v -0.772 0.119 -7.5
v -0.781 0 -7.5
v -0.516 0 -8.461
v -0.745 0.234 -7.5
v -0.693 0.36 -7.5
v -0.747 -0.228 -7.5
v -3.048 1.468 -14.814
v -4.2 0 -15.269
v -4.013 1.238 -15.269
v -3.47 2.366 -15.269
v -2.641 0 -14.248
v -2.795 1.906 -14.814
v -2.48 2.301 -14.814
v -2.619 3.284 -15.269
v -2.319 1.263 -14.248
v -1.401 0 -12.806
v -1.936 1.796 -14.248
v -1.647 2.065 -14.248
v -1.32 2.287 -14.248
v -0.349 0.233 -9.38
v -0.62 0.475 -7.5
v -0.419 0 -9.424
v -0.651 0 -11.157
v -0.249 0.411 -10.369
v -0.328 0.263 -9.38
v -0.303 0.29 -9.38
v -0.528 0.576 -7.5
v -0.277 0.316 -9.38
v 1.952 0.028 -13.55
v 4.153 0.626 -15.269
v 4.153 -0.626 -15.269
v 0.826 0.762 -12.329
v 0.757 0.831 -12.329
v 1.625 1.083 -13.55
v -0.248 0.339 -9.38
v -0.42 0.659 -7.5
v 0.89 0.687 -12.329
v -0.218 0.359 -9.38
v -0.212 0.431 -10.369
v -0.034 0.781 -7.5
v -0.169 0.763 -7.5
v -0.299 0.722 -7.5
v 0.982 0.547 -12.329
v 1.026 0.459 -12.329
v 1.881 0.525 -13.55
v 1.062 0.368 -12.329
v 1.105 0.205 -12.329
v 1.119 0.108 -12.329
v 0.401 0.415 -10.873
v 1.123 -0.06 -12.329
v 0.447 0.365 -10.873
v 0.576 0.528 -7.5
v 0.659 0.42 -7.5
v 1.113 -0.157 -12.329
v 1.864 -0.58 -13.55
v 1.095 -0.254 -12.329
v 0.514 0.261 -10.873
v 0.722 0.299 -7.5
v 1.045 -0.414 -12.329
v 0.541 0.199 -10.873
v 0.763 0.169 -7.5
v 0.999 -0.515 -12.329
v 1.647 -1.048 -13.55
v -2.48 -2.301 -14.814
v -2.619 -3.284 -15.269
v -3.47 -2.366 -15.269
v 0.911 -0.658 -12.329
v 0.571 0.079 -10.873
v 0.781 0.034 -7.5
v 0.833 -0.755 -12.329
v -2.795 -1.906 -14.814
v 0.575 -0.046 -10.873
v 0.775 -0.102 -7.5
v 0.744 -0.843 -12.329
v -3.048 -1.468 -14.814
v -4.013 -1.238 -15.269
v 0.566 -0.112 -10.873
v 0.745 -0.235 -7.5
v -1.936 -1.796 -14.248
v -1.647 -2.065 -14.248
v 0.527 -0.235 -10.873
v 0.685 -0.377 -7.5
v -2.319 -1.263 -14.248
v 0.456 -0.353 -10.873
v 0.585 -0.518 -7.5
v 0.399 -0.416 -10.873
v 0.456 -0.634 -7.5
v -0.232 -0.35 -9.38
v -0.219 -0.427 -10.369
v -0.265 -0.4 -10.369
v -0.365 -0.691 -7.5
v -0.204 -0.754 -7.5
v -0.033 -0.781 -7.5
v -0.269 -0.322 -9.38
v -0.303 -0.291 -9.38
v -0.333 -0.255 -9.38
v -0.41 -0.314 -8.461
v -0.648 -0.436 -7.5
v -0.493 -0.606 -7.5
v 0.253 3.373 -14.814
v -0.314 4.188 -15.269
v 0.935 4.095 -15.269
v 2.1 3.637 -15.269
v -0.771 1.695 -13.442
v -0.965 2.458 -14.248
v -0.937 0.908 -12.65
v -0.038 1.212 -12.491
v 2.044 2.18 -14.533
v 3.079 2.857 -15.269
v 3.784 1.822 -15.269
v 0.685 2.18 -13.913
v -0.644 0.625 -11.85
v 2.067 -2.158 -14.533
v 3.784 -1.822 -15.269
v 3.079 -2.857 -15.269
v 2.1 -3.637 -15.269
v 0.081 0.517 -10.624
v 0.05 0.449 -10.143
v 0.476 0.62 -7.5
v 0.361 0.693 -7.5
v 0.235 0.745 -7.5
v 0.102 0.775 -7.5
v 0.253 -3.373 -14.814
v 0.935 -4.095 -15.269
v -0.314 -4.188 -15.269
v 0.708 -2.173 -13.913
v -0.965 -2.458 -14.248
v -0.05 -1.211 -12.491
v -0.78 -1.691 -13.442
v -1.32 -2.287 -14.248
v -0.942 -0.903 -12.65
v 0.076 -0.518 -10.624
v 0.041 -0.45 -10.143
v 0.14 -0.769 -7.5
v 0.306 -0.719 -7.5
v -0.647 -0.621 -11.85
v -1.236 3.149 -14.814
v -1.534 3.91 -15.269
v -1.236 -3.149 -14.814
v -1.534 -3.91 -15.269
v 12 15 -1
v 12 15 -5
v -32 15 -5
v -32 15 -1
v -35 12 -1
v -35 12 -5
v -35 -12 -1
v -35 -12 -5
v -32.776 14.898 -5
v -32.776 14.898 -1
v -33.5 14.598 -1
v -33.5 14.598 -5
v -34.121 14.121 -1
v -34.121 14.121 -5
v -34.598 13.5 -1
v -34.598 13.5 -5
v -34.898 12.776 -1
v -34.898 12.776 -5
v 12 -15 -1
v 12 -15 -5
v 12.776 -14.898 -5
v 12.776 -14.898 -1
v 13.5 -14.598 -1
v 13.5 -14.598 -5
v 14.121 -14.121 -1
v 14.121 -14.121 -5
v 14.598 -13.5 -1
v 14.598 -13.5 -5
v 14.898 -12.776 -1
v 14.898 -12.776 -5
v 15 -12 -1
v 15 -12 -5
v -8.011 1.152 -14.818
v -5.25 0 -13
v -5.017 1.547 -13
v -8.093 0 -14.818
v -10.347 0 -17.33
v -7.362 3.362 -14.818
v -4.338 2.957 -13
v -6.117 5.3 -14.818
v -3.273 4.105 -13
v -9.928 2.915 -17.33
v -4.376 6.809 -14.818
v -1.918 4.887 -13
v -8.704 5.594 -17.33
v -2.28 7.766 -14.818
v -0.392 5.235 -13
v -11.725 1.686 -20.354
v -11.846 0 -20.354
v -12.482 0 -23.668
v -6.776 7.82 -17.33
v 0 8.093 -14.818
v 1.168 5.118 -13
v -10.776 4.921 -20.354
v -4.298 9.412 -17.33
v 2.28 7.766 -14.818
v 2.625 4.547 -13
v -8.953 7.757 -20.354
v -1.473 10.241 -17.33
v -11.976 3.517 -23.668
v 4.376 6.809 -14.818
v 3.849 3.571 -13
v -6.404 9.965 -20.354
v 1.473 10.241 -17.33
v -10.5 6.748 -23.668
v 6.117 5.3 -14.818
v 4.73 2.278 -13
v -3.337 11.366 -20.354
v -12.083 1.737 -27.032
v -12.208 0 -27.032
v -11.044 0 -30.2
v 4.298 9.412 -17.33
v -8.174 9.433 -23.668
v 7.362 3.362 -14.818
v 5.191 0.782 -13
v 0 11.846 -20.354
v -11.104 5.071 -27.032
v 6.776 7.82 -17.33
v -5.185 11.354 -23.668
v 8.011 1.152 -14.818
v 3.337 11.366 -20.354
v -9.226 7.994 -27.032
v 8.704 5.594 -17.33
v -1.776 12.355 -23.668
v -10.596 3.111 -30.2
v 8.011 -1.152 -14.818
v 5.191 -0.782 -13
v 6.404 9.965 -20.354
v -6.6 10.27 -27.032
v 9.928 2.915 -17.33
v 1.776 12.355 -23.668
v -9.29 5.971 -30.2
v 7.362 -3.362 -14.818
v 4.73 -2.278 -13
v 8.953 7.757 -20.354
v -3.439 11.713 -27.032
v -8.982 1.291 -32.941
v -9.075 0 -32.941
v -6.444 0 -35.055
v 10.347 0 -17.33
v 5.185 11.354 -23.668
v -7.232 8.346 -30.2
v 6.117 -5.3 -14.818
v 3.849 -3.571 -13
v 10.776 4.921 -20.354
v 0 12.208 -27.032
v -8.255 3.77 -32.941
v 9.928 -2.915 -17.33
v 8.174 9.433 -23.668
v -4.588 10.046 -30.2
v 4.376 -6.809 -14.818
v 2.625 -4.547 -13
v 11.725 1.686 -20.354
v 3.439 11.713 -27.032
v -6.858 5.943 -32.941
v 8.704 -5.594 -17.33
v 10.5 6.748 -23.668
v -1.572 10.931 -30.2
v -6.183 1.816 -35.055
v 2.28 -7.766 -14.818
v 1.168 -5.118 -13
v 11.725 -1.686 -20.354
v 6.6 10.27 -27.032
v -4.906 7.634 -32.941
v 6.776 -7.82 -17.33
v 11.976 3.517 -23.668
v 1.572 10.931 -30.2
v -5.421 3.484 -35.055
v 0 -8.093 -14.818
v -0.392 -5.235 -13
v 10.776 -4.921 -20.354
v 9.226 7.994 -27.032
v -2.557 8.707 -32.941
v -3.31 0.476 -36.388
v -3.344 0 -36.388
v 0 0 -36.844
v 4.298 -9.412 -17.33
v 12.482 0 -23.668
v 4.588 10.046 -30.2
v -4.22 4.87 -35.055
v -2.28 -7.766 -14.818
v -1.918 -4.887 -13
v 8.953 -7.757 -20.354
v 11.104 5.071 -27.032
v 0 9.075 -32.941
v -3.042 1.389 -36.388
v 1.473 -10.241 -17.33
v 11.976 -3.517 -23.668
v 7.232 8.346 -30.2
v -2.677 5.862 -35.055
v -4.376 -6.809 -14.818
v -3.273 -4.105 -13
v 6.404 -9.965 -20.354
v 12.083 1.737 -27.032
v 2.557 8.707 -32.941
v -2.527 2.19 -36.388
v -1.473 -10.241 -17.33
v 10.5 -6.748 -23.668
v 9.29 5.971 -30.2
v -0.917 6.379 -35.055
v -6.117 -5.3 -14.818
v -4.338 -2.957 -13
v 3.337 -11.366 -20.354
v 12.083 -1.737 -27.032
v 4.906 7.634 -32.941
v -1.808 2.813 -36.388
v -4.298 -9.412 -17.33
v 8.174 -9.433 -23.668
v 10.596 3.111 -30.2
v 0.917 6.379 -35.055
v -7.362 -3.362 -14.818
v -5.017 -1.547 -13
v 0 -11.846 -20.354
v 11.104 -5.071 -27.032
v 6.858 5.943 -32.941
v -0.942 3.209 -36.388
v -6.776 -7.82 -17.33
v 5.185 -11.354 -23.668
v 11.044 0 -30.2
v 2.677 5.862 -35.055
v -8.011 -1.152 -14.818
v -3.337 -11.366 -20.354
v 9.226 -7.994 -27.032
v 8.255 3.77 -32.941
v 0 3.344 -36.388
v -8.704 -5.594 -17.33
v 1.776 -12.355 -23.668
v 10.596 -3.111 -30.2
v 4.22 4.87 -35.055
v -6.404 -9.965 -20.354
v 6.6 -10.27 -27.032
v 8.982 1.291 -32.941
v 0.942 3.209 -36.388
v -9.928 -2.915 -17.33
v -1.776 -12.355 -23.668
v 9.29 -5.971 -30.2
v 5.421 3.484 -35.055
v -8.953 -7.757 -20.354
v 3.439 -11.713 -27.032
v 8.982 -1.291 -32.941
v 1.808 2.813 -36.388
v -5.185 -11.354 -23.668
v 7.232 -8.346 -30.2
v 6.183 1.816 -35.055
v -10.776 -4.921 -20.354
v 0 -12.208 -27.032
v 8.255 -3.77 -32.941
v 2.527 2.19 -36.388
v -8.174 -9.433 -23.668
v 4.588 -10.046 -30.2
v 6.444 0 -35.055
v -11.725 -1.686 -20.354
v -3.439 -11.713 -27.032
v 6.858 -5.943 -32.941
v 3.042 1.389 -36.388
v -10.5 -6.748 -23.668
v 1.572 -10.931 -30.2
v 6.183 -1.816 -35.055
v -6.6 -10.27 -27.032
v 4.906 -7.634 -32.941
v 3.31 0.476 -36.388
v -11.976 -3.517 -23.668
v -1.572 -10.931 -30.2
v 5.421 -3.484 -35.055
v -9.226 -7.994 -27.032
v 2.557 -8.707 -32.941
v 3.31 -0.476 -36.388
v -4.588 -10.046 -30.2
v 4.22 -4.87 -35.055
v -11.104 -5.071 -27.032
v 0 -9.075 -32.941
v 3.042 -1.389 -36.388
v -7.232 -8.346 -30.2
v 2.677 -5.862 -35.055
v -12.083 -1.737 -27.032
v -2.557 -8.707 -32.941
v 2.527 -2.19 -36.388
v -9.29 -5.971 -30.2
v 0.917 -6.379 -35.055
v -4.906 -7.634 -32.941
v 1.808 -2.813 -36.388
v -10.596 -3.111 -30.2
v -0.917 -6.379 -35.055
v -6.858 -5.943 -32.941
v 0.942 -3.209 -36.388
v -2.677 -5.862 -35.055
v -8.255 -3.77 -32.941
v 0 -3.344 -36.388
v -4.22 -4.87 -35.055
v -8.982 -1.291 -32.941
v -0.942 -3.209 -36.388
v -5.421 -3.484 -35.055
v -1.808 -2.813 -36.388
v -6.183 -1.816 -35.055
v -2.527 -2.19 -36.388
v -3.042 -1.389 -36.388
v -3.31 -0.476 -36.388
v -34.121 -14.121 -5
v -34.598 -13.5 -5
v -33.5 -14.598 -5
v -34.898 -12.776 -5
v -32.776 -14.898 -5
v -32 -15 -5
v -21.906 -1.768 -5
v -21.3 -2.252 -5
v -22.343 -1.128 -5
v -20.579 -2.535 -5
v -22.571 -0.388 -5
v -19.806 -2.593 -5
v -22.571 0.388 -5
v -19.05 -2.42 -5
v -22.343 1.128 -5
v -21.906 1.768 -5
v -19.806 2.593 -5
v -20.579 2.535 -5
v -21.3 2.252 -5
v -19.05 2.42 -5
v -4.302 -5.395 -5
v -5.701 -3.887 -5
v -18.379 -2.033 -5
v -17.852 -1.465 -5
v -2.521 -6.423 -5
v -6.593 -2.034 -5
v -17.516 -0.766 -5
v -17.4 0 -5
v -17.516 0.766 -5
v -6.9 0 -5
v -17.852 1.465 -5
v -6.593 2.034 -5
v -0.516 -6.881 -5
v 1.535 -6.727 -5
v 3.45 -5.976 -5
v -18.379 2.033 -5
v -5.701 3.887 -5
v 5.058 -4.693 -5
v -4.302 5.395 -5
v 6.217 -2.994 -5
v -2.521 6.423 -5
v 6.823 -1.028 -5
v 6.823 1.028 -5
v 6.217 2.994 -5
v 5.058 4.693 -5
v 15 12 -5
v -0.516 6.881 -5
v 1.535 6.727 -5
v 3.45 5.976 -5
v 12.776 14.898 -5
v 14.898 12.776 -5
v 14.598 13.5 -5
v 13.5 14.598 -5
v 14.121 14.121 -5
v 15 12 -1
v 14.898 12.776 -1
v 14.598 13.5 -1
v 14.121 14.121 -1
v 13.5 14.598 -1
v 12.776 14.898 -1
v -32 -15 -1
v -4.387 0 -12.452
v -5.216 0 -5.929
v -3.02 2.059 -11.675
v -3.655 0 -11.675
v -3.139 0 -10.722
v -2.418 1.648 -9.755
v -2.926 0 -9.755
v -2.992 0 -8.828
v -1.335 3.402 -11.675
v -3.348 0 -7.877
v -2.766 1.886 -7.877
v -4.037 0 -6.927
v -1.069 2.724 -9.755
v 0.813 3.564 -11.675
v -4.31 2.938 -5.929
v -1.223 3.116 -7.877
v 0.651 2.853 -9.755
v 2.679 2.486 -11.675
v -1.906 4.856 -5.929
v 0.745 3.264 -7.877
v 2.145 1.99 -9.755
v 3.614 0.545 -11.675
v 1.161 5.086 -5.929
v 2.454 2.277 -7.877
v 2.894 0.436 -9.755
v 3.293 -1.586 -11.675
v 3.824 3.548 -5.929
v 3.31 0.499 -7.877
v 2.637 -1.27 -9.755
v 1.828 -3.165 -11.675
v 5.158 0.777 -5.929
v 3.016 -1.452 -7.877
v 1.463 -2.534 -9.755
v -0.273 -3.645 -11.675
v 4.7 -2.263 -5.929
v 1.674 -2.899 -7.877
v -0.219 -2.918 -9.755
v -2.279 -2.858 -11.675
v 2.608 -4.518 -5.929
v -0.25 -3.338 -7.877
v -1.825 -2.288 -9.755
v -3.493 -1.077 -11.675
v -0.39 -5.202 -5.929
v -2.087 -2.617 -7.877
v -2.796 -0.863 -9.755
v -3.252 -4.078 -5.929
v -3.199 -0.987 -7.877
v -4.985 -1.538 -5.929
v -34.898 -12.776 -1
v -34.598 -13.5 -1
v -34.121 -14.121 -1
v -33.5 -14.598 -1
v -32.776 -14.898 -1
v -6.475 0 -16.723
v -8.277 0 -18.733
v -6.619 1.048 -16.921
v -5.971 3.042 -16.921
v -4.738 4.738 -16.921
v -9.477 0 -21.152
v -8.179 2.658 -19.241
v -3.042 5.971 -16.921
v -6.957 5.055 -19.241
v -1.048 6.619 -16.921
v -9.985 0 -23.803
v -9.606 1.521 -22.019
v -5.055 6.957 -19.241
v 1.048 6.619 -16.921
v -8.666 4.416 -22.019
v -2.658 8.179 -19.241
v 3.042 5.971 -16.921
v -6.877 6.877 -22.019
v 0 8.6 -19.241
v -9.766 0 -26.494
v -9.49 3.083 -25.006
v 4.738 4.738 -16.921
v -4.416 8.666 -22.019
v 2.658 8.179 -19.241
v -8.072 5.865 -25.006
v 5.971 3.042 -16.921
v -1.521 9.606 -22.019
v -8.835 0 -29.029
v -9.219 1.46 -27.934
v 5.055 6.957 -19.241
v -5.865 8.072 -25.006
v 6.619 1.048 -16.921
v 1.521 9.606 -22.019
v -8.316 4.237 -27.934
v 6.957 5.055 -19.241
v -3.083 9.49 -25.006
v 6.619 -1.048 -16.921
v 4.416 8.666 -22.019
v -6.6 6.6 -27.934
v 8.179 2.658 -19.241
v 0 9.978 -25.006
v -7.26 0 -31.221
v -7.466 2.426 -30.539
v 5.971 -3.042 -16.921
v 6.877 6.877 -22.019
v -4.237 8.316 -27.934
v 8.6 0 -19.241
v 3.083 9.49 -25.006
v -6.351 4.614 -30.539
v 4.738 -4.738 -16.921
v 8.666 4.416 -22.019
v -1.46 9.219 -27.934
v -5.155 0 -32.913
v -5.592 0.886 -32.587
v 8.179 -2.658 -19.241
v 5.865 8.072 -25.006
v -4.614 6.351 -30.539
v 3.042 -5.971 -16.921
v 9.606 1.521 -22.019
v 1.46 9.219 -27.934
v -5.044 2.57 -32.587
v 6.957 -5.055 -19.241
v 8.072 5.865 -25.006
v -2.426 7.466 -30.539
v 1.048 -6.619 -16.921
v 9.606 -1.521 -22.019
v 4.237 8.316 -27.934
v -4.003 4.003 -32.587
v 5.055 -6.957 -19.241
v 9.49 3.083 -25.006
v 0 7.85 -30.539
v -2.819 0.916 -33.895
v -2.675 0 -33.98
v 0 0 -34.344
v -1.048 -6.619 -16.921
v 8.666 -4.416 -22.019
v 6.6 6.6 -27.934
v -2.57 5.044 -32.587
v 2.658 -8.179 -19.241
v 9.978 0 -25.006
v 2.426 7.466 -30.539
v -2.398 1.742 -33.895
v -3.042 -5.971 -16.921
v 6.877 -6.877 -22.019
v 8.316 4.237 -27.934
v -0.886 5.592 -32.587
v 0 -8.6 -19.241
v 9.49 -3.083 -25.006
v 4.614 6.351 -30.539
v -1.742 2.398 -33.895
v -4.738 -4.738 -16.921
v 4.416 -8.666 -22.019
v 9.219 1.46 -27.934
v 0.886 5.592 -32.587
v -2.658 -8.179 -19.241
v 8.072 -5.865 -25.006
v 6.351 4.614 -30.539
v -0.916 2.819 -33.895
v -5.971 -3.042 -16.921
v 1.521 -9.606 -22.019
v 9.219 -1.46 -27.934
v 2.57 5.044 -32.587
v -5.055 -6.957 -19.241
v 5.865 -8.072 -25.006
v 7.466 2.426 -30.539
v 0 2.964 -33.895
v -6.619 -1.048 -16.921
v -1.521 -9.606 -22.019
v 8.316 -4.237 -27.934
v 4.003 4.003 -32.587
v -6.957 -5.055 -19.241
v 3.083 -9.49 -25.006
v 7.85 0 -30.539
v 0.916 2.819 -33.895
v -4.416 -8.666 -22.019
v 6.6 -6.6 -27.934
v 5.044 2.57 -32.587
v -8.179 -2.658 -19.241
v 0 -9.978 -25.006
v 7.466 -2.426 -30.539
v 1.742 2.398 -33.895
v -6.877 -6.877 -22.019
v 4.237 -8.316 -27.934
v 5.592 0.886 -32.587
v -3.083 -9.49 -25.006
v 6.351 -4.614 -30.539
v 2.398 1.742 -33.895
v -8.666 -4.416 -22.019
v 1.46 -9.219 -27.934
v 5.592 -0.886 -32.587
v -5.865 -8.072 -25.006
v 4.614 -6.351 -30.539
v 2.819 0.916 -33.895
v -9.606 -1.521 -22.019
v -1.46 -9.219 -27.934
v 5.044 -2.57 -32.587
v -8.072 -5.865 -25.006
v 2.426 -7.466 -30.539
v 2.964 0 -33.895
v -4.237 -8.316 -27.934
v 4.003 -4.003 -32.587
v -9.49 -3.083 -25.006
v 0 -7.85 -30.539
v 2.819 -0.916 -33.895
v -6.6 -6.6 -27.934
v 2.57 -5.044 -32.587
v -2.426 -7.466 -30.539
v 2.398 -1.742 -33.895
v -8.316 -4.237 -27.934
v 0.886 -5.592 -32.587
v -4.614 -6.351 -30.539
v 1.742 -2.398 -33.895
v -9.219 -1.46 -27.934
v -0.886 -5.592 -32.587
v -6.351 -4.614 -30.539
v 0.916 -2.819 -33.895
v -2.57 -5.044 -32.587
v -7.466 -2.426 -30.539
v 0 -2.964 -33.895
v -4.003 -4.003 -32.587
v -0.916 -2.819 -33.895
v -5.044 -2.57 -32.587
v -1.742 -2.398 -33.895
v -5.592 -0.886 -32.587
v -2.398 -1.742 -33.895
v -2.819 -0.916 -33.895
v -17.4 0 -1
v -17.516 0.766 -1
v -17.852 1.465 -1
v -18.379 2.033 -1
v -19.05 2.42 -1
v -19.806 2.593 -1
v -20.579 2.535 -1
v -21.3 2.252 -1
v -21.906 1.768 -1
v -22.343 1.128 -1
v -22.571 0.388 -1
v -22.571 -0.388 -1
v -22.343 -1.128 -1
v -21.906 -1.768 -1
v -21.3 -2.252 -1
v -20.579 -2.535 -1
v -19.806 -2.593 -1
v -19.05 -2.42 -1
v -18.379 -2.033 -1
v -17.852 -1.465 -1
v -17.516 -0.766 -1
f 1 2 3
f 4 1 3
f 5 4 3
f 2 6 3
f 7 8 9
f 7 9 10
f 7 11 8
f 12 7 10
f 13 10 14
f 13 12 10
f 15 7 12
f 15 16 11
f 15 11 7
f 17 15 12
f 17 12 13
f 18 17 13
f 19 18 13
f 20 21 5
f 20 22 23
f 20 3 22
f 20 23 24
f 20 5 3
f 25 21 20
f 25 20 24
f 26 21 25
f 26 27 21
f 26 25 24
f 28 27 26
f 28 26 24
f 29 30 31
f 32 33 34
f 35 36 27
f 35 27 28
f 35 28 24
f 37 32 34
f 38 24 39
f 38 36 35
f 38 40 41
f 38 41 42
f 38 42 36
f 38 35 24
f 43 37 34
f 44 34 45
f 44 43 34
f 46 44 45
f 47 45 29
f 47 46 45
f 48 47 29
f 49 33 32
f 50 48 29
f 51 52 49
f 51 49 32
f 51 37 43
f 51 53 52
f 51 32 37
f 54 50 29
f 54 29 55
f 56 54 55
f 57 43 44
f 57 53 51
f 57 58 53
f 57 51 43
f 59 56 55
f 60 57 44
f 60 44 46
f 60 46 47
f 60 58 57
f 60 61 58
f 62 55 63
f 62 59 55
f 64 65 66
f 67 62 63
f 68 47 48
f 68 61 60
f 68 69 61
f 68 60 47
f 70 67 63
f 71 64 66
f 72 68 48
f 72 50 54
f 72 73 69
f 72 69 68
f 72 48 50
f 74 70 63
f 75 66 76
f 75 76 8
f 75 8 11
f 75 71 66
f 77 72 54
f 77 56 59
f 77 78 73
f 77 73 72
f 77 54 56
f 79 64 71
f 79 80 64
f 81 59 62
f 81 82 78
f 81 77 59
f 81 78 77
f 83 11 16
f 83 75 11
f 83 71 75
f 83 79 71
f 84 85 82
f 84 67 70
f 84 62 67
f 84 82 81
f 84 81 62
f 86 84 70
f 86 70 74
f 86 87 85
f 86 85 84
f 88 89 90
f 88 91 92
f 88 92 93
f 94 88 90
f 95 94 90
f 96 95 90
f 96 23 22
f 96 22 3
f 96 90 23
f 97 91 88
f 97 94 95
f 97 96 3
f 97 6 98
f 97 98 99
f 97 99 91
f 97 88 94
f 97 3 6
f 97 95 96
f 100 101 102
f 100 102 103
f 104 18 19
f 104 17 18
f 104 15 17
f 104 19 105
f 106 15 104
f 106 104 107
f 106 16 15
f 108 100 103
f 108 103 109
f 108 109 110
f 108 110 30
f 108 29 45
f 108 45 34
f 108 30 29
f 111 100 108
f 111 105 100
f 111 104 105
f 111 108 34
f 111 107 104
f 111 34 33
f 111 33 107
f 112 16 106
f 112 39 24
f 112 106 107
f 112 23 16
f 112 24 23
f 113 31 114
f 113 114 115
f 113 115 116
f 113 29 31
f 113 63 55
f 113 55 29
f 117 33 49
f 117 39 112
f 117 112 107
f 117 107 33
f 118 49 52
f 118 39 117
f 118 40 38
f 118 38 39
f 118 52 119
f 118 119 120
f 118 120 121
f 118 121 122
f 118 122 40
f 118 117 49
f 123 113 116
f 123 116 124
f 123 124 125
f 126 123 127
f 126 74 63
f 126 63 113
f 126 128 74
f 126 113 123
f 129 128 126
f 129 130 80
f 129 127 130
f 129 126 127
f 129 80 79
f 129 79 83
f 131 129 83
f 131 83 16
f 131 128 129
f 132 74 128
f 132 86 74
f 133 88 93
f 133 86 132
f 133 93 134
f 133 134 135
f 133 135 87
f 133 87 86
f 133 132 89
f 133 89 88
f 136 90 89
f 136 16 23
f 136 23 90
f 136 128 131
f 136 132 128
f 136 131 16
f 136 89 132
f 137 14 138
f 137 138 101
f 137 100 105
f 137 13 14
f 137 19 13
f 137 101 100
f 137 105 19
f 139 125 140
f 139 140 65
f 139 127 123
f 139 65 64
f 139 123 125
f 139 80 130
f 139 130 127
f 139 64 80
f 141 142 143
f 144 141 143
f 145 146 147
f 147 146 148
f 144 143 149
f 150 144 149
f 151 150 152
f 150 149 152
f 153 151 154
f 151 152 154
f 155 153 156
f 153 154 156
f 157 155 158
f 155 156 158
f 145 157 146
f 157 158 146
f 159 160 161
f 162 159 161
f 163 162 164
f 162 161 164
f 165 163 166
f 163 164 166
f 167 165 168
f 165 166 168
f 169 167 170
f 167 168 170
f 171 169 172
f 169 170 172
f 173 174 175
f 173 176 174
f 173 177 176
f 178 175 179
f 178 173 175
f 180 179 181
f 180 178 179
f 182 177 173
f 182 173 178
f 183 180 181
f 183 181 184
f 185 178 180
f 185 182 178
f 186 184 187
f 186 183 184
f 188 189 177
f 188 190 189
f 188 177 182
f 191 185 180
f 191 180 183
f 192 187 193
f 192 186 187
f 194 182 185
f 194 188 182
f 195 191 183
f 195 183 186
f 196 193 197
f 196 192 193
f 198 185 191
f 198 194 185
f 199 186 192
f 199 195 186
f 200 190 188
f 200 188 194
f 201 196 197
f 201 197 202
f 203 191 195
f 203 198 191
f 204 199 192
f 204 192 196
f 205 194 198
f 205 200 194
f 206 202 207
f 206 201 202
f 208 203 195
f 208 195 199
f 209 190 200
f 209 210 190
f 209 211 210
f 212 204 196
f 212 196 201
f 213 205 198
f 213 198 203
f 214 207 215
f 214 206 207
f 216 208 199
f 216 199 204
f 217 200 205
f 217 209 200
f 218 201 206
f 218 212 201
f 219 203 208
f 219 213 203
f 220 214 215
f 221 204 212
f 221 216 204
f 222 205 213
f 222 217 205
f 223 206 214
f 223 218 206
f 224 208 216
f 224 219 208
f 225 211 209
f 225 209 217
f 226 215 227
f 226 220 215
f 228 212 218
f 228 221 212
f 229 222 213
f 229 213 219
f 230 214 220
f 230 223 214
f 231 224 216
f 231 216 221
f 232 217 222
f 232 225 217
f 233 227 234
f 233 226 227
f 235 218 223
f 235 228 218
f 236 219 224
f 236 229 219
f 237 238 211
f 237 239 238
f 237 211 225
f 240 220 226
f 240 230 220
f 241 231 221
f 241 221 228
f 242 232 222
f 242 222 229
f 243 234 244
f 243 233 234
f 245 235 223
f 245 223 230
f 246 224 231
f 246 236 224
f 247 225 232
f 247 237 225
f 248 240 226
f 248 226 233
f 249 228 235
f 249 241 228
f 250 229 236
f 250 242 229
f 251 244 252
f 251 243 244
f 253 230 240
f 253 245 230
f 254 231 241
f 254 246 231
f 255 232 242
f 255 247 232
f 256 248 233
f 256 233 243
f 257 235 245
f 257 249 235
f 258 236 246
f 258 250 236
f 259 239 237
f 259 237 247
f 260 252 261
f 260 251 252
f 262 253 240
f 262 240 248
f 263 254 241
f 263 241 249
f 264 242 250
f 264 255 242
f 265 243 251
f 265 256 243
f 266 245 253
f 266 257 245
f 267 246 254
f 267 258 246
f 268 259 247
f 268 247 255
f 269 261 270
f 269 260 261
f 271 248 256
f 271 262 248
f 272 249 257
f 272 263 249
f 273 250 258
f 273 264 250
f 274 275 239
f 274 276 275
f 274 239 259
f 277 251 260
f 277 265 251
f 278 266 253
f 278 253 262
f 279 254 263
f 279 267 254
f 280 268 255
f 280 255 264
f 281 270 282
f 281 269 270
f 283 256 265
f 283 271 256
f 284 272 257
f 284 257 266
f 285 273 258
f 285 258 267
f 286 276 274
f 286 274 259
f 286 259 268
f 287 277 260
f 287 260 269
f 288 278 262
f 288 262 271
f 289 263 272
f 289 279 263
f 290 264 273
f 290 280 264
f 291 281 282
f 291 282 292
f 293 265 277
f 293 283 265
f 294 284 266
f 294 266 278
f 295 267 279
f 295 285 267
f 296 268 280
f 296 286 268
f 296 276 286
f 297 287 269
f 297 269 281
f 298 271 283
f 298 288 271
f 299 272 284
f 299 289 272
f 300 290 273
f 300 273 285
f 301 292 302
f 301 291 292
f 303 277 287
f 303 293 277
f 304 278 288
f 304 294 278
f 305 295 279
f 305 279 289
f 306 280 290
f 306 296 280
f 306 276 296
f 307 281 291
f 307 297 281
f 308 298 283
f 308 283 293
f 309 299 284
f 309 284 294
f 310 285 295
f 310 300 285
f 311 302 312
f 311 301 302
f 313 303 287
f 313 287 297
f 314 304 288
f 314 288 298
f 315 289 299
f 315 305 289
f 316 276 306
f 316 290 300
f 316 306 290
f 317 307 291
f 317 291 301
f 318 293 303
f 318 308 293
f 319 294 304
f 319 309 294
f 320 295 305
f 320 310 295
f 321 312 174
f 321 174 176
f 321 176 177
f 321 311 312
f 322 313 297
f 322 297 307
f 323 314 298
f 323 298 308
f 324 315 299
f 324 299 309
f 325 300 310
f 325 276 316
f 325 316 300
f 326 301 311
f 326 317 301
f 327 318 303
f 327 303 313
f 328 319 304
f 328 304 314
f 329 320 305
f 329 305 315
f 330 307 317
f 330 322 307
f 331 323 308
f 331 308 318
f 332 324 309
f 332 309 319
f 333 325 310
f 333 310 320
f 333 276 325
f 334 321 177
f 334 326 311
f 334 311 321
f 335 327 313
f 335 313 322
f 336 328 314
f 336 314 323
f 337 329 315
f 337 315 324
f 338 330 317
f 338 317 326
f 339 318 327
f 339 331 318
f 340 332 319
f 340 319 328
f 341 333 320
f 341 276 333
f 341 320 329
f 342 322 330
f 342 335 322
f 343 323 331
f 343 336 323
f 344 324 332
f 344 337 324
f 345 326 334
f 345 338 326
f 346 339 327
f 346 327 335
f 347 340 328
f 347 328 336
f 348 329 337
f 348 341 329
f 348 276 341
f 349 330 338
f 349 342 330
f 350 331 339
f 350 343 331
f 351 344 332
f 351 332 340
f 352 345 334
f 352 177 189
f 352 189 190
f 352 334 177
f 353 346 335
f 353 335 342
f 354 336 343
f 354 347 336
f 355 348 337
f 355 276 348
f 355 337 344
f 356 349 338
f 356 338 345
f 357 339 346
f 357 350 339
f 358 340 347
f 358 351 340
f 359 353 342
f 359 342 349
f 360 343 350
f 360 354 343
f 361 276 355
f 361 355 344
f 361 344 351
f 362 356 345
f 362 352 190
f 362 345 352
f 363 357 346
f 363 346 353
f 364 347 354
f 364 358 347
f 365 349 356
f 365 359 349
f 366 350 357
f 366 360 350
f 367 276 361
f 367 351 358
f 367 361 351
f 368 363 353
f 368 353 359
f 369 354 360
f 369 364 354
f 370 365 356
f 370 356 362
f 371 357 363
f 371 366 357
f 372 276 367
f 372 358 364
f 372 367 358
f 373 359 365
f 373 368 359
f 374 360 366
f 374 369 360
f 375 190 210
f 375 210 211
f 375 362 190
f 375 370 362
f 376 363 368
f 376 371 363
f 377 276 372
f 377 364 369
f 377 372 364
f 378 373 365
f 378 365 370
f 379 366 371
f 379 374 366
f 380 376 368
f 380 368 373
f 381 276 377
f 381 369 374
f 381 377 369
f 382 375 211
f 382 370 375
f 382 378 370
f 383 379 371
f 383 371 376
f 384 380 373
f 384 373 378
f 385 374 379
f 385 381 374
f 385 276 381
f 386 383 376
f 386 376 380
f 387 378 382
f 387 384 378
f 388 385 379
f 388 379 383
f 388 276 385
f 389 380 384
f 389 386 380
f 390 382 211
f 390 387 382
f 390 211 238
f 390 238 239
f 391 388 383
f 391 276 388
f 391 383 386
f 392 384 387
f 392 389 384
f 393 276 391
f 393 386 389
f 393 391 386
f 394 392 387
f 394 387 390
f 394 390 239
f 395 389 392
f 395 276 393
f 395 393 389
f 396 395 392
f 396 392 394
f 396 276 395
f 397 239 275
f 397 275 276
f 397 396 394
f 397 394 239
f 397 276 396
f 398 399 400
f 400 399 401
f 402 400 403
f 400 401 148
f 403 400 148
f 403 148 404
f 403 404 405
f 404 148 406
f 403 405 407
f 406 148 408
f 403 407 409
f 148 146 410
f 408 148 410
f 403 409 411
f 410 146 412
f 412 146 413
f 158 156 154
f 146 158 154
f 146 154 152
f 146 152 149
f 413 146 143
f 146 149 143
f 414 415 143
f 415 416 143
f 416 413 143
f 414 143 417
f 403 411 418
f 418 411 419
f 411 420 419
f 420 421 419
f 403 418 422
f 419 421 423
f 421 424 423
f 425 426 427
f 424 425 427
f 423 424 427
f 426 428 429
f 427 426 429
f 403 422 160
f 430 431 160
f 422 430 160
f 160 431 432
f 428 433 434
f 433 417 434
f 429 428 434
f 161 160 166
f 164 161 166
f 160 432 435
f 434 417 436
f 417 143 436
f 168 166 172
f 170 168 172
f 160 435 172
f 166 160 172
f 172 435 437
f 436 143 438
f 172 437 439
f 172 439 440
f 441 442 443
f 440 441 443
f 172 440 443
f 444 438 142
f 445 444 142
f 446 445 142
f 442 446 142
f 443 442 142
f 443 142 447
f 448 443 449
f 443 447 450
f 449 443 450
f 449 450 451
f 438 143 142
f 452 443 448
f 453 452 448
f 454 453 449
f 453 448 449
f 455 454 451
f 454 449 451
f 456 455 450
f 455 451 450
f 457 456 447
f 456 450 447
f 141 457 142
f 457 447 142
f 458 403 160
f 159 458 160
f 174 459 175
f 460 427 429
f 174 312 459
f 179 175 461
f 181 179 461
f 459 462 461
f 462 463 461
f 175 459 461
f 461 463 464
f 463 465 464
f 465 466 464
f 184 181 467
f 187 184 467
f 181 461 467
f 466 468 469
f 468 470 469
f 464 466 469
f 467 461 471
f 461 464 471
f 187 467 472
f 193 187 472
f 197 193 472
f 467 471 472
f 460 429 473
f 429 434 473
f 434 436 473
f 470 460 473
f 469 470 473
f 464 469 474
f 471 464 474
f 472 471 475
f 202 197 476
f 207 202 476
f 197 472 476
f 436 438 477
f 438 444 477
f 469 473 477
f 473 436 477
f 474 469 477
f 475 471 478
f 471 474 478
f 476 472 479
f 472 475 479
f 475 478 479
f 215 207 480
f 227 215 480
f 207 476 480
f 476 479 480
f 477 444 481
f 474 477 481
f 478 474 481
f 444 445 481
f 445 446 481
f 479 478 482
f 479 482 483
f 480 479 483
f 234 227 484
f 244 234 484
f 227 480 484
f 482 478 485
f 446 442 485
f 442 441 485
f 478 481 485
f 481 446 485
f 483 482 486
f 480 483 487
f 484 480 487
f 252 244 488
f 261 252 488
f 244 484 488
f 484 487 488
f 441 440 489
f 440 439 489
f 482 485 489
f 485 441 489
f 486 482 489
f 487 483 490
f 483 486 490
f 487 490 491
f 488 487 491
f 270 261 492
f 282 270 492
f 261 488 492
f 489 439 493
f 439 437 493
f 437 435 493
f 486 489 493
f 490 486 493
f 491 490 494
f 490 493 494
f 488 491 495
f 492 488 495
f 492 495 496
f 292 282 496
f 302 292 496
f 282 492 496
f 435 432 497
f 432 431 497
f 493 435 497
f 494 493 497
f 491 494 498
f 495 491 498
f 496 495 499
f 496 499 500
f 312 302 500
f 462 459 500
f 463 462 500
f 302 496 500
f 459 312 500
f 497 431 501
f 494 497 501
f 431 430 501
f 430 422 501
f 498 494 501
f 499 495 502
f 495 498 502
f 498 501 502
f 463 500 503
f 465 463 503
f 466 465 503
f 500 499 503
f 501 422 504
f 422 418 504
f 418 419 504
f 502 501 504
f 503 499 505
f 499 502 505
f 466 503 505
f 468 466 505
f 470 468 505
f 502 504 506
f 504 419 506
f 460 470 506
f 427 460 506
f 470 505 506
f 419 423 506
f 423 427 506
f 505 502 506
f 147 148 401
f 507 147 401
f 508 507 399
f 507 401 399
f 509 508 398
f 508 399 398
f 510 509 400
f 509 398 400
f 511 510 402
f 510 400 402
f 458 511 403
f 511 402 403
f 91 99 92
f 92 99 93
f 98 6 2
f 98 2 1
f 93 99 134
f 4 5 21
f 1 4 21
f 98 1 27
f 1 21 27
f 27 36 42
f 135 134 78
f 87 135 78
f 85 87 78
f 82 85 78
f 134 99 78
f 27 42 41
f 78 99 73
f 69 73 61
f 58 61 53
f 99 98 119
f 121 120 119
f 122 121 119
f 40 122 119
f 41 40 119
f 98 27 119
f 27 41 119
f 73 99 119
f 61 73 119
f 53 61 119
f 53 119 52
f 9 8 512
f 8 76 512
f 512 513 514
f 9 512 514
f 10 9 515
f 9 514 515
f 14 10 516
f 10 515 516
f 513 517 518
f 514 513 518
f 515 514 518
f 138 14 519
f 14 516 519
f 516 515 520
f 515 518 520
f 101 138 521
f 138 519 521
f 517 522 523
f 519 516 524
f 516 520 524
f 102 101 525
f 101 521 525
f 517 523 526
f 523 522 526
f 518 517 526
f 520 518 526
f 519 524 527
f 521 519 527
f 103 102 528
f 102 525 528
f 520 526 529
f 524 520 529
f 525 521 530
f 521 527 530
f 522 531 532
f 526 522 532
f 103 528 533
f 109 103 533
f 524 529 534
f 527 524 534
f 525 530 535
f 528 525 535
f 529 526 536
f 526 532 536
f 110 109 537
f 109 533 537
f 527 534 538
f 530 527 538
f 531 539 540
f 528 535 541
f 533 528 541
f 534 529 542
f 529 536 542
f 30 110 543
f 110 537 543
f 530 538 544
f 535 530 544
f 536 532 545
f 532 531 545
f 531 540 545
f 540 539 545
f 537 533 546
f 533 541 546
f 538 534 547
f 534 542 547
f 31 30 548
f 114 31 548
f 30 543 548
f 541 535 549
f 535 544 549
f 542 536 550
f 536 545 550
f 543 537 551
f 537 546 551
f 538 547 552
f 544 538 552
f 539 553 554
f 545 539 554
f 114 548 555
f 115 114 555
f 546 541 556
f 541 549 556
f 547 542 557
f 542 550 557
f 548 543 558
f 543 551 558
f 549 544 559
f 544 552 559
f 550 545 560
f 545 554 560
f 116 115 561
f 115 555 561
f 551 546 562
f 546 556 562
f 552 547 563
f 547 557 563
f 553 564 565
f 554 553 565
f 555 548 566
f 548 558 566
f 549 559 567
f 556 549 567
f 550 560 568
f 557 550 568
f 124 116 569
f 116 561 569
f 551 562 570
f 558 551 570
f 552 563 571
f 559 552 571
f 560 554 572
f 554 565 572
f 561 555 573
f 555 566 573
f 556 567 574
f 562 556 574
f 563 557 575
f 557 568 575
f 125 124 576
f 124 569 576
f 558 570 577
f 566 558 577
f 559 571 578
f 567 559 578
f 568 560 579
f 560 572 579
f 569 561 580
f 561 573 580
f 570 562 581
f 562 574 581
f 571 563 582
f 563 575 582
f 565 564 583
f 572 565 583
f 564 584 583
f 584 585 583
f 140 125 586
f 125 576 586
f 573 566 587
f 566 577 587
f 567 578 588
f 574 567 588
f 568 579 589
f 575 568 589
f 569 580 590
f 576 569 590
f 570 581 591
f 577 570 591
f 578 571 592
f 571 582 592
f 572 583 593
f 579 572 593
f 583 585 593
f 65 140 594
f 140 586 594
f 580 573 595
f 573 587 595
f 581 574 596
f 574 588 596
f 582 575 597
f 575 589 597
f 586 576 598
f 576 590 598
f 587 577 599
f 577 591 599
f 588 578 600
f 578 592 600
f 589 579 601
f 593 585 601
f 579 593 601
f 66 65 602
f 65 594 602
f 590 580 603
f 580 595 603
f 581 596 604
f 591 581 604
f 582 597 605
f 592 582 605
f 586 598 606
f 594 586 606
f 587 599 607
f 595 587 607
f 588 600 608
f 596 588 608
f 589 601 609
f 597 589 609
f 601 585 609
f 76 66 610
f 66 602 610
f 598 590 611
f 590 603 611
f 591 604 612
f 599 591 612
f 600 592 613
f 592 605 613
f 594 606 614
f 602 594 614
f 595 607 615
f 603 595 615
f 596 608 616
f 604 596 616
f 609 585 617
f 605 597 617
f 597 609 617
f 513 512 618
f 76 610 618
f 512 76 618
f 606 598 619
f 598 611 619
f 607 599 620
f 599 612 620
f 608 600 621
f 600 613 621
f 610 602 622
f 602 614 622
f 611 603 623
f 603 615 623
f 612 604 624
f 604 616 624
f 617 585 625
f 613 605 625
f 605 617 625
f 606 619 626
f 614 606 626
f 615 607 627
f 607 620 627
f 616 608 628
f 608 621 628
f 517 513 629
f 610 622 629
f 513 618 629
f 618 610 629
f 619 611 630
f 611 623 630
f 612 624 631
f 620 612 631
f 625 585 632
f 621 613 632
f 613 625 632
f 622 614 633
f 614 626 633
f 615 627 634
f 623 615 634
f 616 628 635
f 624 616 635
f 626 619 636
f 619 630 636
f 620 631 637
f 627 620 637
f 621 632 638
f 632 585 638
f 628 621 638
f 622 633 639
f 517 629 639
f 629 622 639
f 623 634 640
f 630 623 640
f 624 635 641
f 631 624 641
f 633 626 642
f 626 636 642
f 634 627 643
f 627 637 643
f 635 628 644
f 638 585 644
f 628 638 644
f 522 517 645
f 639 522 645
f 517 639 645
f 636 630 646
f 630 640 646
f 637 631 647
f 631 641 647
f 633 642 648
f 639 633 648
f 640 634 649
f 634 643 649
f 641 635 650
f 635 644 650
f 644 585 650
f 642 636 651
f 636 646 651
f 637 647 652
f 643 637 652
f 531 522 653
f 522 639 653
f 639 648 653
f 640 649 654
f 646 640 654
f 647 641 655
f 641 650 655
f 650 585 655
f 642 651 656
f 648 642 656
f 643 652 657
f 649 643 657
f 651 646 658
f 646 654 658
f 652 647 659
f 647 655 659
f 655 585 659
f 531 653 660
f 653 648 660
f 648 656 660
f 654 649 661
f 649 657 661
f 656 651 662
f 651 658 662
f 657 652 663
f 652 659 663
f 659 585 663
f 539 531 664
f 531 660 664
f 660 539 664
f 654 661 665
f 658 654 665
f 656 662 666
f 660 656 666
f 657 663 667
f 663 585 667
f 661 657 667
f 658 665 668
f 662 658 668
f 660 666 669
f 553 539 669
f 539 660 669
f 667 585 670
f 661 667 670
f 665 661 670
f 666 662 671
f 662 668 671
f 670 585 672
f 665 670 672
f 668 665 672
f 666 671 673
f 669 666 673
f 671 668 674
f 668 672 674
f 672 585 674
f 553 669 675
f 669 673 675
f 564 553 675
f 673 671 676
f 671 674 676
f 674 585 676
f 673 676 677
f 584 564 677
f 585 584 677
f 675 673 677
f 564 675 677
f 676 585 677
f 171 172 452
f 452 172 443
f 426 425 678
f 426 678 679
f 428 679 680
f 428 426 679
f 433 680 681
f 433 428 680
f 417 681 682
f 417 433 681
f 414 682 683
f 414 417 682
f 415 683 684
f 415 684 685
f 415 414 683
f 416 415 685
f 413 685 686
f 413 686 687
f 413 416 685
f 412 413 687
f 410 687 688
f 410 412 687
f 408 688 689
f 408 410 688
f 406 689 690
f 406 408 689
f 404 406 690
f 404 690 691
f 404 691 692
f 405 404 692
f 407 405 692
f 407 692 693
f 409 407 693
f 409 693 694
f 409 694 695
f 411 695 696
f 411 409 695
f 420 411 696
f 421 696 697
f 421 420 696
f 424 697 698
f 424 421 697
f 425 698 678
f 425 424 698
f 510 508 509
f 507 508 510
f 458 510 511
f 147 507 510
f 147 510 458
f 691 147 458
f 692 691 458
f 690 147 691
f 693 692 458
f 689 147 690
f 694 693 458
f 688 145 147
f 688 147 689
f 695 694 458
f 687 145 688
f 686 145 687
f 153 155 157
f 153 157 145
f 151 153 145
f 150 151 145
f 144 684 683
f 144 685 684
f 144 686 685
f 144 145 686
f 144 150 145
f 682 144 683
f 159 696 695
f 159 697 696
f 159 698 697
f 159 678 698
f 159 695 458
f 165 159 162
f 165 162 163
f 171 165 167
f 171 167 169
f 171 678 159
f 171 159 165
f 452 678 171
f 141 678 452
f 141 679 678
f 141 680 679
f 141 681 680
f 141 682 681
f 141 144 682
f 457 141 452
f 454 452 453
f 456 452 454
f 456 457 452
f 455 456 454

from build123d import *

# Parameters (mm, degrees)
F2_T     = -2.5
F3_R     = 2.6
F4_DEPTH = 4


with BuildPart() as f1:
    # F0 (on Front) → F1 (revolve)
    with BuildSketch(Plane.XZ):
        with BuildLine():
            Line((0, -36.8440513045), (0, -11.8440513045))
            ThreePointArc((0, -11.8440513045), (-2.6878763637, -12.1364585585), (-5.25, -13))
            ThreePointArc((-5.25, -13), (-12.207592746, -27.0319276683), (0, -36.8440513045))
        make_face()
        with BuildLine():
            Line((0, -11.8440513045), (0, -5))
            Line((0, -5), (-6.9, -5))
            add(Edge.make_bspline(
                [(-5.25, -13), (-2.8193239395, -11.8750888924), (-0.9143215768, -7.7015358731), (-6.9, -5)],
                knots=[0, 0, 0, 0, 8.1683841731, 8.1683841731, 8.1683841731, 8.1683841731], degree=3))
            ThreePointArc((-5.25, -13), (-2.6878763637, -12.1364585585), (0, -11.8440513045))
        make_face()
    revolve(axis=Axis((0, 0, -18.4220256523), (0, 0, -1)))

    # F2 (hollow: no face is removed)
    offset(amount=F2_T, kind=Kind.INTERSECTION, mode=Mode.SUBTRACT)

    # F3 (on face) → F4 (join)
    with BuildSketch(Plane.XY.offset(-5)):
        with BuildLine():
            Line((-32, -15), (12, -15))
            ThreePointArc((12, -15), (14.1213203436, -14.1213203436), (15, -12))
            Line((15, -12), (15, 12))
            ThreePointArc((15, 12), (14.1213203436, 14.1213203436), (12, 15))
            Line((12, 15), (-32, 15))
            ThreePointArc((-32, 15), (-34.1213203436, 14.1213203436), (-35, 12))
            Line((-35, 12), (-35, -12))
            ThreePointArc((-35, -12), (-34.1213203436, -14.1213203436), (-32, -15))
        make_face()
        with Locations((-20, 0)):
            Circle(F3_R, mode=Mode.SUBTRACT)
    extrude(amount=F4_DEPTH)


solid = f1.part
